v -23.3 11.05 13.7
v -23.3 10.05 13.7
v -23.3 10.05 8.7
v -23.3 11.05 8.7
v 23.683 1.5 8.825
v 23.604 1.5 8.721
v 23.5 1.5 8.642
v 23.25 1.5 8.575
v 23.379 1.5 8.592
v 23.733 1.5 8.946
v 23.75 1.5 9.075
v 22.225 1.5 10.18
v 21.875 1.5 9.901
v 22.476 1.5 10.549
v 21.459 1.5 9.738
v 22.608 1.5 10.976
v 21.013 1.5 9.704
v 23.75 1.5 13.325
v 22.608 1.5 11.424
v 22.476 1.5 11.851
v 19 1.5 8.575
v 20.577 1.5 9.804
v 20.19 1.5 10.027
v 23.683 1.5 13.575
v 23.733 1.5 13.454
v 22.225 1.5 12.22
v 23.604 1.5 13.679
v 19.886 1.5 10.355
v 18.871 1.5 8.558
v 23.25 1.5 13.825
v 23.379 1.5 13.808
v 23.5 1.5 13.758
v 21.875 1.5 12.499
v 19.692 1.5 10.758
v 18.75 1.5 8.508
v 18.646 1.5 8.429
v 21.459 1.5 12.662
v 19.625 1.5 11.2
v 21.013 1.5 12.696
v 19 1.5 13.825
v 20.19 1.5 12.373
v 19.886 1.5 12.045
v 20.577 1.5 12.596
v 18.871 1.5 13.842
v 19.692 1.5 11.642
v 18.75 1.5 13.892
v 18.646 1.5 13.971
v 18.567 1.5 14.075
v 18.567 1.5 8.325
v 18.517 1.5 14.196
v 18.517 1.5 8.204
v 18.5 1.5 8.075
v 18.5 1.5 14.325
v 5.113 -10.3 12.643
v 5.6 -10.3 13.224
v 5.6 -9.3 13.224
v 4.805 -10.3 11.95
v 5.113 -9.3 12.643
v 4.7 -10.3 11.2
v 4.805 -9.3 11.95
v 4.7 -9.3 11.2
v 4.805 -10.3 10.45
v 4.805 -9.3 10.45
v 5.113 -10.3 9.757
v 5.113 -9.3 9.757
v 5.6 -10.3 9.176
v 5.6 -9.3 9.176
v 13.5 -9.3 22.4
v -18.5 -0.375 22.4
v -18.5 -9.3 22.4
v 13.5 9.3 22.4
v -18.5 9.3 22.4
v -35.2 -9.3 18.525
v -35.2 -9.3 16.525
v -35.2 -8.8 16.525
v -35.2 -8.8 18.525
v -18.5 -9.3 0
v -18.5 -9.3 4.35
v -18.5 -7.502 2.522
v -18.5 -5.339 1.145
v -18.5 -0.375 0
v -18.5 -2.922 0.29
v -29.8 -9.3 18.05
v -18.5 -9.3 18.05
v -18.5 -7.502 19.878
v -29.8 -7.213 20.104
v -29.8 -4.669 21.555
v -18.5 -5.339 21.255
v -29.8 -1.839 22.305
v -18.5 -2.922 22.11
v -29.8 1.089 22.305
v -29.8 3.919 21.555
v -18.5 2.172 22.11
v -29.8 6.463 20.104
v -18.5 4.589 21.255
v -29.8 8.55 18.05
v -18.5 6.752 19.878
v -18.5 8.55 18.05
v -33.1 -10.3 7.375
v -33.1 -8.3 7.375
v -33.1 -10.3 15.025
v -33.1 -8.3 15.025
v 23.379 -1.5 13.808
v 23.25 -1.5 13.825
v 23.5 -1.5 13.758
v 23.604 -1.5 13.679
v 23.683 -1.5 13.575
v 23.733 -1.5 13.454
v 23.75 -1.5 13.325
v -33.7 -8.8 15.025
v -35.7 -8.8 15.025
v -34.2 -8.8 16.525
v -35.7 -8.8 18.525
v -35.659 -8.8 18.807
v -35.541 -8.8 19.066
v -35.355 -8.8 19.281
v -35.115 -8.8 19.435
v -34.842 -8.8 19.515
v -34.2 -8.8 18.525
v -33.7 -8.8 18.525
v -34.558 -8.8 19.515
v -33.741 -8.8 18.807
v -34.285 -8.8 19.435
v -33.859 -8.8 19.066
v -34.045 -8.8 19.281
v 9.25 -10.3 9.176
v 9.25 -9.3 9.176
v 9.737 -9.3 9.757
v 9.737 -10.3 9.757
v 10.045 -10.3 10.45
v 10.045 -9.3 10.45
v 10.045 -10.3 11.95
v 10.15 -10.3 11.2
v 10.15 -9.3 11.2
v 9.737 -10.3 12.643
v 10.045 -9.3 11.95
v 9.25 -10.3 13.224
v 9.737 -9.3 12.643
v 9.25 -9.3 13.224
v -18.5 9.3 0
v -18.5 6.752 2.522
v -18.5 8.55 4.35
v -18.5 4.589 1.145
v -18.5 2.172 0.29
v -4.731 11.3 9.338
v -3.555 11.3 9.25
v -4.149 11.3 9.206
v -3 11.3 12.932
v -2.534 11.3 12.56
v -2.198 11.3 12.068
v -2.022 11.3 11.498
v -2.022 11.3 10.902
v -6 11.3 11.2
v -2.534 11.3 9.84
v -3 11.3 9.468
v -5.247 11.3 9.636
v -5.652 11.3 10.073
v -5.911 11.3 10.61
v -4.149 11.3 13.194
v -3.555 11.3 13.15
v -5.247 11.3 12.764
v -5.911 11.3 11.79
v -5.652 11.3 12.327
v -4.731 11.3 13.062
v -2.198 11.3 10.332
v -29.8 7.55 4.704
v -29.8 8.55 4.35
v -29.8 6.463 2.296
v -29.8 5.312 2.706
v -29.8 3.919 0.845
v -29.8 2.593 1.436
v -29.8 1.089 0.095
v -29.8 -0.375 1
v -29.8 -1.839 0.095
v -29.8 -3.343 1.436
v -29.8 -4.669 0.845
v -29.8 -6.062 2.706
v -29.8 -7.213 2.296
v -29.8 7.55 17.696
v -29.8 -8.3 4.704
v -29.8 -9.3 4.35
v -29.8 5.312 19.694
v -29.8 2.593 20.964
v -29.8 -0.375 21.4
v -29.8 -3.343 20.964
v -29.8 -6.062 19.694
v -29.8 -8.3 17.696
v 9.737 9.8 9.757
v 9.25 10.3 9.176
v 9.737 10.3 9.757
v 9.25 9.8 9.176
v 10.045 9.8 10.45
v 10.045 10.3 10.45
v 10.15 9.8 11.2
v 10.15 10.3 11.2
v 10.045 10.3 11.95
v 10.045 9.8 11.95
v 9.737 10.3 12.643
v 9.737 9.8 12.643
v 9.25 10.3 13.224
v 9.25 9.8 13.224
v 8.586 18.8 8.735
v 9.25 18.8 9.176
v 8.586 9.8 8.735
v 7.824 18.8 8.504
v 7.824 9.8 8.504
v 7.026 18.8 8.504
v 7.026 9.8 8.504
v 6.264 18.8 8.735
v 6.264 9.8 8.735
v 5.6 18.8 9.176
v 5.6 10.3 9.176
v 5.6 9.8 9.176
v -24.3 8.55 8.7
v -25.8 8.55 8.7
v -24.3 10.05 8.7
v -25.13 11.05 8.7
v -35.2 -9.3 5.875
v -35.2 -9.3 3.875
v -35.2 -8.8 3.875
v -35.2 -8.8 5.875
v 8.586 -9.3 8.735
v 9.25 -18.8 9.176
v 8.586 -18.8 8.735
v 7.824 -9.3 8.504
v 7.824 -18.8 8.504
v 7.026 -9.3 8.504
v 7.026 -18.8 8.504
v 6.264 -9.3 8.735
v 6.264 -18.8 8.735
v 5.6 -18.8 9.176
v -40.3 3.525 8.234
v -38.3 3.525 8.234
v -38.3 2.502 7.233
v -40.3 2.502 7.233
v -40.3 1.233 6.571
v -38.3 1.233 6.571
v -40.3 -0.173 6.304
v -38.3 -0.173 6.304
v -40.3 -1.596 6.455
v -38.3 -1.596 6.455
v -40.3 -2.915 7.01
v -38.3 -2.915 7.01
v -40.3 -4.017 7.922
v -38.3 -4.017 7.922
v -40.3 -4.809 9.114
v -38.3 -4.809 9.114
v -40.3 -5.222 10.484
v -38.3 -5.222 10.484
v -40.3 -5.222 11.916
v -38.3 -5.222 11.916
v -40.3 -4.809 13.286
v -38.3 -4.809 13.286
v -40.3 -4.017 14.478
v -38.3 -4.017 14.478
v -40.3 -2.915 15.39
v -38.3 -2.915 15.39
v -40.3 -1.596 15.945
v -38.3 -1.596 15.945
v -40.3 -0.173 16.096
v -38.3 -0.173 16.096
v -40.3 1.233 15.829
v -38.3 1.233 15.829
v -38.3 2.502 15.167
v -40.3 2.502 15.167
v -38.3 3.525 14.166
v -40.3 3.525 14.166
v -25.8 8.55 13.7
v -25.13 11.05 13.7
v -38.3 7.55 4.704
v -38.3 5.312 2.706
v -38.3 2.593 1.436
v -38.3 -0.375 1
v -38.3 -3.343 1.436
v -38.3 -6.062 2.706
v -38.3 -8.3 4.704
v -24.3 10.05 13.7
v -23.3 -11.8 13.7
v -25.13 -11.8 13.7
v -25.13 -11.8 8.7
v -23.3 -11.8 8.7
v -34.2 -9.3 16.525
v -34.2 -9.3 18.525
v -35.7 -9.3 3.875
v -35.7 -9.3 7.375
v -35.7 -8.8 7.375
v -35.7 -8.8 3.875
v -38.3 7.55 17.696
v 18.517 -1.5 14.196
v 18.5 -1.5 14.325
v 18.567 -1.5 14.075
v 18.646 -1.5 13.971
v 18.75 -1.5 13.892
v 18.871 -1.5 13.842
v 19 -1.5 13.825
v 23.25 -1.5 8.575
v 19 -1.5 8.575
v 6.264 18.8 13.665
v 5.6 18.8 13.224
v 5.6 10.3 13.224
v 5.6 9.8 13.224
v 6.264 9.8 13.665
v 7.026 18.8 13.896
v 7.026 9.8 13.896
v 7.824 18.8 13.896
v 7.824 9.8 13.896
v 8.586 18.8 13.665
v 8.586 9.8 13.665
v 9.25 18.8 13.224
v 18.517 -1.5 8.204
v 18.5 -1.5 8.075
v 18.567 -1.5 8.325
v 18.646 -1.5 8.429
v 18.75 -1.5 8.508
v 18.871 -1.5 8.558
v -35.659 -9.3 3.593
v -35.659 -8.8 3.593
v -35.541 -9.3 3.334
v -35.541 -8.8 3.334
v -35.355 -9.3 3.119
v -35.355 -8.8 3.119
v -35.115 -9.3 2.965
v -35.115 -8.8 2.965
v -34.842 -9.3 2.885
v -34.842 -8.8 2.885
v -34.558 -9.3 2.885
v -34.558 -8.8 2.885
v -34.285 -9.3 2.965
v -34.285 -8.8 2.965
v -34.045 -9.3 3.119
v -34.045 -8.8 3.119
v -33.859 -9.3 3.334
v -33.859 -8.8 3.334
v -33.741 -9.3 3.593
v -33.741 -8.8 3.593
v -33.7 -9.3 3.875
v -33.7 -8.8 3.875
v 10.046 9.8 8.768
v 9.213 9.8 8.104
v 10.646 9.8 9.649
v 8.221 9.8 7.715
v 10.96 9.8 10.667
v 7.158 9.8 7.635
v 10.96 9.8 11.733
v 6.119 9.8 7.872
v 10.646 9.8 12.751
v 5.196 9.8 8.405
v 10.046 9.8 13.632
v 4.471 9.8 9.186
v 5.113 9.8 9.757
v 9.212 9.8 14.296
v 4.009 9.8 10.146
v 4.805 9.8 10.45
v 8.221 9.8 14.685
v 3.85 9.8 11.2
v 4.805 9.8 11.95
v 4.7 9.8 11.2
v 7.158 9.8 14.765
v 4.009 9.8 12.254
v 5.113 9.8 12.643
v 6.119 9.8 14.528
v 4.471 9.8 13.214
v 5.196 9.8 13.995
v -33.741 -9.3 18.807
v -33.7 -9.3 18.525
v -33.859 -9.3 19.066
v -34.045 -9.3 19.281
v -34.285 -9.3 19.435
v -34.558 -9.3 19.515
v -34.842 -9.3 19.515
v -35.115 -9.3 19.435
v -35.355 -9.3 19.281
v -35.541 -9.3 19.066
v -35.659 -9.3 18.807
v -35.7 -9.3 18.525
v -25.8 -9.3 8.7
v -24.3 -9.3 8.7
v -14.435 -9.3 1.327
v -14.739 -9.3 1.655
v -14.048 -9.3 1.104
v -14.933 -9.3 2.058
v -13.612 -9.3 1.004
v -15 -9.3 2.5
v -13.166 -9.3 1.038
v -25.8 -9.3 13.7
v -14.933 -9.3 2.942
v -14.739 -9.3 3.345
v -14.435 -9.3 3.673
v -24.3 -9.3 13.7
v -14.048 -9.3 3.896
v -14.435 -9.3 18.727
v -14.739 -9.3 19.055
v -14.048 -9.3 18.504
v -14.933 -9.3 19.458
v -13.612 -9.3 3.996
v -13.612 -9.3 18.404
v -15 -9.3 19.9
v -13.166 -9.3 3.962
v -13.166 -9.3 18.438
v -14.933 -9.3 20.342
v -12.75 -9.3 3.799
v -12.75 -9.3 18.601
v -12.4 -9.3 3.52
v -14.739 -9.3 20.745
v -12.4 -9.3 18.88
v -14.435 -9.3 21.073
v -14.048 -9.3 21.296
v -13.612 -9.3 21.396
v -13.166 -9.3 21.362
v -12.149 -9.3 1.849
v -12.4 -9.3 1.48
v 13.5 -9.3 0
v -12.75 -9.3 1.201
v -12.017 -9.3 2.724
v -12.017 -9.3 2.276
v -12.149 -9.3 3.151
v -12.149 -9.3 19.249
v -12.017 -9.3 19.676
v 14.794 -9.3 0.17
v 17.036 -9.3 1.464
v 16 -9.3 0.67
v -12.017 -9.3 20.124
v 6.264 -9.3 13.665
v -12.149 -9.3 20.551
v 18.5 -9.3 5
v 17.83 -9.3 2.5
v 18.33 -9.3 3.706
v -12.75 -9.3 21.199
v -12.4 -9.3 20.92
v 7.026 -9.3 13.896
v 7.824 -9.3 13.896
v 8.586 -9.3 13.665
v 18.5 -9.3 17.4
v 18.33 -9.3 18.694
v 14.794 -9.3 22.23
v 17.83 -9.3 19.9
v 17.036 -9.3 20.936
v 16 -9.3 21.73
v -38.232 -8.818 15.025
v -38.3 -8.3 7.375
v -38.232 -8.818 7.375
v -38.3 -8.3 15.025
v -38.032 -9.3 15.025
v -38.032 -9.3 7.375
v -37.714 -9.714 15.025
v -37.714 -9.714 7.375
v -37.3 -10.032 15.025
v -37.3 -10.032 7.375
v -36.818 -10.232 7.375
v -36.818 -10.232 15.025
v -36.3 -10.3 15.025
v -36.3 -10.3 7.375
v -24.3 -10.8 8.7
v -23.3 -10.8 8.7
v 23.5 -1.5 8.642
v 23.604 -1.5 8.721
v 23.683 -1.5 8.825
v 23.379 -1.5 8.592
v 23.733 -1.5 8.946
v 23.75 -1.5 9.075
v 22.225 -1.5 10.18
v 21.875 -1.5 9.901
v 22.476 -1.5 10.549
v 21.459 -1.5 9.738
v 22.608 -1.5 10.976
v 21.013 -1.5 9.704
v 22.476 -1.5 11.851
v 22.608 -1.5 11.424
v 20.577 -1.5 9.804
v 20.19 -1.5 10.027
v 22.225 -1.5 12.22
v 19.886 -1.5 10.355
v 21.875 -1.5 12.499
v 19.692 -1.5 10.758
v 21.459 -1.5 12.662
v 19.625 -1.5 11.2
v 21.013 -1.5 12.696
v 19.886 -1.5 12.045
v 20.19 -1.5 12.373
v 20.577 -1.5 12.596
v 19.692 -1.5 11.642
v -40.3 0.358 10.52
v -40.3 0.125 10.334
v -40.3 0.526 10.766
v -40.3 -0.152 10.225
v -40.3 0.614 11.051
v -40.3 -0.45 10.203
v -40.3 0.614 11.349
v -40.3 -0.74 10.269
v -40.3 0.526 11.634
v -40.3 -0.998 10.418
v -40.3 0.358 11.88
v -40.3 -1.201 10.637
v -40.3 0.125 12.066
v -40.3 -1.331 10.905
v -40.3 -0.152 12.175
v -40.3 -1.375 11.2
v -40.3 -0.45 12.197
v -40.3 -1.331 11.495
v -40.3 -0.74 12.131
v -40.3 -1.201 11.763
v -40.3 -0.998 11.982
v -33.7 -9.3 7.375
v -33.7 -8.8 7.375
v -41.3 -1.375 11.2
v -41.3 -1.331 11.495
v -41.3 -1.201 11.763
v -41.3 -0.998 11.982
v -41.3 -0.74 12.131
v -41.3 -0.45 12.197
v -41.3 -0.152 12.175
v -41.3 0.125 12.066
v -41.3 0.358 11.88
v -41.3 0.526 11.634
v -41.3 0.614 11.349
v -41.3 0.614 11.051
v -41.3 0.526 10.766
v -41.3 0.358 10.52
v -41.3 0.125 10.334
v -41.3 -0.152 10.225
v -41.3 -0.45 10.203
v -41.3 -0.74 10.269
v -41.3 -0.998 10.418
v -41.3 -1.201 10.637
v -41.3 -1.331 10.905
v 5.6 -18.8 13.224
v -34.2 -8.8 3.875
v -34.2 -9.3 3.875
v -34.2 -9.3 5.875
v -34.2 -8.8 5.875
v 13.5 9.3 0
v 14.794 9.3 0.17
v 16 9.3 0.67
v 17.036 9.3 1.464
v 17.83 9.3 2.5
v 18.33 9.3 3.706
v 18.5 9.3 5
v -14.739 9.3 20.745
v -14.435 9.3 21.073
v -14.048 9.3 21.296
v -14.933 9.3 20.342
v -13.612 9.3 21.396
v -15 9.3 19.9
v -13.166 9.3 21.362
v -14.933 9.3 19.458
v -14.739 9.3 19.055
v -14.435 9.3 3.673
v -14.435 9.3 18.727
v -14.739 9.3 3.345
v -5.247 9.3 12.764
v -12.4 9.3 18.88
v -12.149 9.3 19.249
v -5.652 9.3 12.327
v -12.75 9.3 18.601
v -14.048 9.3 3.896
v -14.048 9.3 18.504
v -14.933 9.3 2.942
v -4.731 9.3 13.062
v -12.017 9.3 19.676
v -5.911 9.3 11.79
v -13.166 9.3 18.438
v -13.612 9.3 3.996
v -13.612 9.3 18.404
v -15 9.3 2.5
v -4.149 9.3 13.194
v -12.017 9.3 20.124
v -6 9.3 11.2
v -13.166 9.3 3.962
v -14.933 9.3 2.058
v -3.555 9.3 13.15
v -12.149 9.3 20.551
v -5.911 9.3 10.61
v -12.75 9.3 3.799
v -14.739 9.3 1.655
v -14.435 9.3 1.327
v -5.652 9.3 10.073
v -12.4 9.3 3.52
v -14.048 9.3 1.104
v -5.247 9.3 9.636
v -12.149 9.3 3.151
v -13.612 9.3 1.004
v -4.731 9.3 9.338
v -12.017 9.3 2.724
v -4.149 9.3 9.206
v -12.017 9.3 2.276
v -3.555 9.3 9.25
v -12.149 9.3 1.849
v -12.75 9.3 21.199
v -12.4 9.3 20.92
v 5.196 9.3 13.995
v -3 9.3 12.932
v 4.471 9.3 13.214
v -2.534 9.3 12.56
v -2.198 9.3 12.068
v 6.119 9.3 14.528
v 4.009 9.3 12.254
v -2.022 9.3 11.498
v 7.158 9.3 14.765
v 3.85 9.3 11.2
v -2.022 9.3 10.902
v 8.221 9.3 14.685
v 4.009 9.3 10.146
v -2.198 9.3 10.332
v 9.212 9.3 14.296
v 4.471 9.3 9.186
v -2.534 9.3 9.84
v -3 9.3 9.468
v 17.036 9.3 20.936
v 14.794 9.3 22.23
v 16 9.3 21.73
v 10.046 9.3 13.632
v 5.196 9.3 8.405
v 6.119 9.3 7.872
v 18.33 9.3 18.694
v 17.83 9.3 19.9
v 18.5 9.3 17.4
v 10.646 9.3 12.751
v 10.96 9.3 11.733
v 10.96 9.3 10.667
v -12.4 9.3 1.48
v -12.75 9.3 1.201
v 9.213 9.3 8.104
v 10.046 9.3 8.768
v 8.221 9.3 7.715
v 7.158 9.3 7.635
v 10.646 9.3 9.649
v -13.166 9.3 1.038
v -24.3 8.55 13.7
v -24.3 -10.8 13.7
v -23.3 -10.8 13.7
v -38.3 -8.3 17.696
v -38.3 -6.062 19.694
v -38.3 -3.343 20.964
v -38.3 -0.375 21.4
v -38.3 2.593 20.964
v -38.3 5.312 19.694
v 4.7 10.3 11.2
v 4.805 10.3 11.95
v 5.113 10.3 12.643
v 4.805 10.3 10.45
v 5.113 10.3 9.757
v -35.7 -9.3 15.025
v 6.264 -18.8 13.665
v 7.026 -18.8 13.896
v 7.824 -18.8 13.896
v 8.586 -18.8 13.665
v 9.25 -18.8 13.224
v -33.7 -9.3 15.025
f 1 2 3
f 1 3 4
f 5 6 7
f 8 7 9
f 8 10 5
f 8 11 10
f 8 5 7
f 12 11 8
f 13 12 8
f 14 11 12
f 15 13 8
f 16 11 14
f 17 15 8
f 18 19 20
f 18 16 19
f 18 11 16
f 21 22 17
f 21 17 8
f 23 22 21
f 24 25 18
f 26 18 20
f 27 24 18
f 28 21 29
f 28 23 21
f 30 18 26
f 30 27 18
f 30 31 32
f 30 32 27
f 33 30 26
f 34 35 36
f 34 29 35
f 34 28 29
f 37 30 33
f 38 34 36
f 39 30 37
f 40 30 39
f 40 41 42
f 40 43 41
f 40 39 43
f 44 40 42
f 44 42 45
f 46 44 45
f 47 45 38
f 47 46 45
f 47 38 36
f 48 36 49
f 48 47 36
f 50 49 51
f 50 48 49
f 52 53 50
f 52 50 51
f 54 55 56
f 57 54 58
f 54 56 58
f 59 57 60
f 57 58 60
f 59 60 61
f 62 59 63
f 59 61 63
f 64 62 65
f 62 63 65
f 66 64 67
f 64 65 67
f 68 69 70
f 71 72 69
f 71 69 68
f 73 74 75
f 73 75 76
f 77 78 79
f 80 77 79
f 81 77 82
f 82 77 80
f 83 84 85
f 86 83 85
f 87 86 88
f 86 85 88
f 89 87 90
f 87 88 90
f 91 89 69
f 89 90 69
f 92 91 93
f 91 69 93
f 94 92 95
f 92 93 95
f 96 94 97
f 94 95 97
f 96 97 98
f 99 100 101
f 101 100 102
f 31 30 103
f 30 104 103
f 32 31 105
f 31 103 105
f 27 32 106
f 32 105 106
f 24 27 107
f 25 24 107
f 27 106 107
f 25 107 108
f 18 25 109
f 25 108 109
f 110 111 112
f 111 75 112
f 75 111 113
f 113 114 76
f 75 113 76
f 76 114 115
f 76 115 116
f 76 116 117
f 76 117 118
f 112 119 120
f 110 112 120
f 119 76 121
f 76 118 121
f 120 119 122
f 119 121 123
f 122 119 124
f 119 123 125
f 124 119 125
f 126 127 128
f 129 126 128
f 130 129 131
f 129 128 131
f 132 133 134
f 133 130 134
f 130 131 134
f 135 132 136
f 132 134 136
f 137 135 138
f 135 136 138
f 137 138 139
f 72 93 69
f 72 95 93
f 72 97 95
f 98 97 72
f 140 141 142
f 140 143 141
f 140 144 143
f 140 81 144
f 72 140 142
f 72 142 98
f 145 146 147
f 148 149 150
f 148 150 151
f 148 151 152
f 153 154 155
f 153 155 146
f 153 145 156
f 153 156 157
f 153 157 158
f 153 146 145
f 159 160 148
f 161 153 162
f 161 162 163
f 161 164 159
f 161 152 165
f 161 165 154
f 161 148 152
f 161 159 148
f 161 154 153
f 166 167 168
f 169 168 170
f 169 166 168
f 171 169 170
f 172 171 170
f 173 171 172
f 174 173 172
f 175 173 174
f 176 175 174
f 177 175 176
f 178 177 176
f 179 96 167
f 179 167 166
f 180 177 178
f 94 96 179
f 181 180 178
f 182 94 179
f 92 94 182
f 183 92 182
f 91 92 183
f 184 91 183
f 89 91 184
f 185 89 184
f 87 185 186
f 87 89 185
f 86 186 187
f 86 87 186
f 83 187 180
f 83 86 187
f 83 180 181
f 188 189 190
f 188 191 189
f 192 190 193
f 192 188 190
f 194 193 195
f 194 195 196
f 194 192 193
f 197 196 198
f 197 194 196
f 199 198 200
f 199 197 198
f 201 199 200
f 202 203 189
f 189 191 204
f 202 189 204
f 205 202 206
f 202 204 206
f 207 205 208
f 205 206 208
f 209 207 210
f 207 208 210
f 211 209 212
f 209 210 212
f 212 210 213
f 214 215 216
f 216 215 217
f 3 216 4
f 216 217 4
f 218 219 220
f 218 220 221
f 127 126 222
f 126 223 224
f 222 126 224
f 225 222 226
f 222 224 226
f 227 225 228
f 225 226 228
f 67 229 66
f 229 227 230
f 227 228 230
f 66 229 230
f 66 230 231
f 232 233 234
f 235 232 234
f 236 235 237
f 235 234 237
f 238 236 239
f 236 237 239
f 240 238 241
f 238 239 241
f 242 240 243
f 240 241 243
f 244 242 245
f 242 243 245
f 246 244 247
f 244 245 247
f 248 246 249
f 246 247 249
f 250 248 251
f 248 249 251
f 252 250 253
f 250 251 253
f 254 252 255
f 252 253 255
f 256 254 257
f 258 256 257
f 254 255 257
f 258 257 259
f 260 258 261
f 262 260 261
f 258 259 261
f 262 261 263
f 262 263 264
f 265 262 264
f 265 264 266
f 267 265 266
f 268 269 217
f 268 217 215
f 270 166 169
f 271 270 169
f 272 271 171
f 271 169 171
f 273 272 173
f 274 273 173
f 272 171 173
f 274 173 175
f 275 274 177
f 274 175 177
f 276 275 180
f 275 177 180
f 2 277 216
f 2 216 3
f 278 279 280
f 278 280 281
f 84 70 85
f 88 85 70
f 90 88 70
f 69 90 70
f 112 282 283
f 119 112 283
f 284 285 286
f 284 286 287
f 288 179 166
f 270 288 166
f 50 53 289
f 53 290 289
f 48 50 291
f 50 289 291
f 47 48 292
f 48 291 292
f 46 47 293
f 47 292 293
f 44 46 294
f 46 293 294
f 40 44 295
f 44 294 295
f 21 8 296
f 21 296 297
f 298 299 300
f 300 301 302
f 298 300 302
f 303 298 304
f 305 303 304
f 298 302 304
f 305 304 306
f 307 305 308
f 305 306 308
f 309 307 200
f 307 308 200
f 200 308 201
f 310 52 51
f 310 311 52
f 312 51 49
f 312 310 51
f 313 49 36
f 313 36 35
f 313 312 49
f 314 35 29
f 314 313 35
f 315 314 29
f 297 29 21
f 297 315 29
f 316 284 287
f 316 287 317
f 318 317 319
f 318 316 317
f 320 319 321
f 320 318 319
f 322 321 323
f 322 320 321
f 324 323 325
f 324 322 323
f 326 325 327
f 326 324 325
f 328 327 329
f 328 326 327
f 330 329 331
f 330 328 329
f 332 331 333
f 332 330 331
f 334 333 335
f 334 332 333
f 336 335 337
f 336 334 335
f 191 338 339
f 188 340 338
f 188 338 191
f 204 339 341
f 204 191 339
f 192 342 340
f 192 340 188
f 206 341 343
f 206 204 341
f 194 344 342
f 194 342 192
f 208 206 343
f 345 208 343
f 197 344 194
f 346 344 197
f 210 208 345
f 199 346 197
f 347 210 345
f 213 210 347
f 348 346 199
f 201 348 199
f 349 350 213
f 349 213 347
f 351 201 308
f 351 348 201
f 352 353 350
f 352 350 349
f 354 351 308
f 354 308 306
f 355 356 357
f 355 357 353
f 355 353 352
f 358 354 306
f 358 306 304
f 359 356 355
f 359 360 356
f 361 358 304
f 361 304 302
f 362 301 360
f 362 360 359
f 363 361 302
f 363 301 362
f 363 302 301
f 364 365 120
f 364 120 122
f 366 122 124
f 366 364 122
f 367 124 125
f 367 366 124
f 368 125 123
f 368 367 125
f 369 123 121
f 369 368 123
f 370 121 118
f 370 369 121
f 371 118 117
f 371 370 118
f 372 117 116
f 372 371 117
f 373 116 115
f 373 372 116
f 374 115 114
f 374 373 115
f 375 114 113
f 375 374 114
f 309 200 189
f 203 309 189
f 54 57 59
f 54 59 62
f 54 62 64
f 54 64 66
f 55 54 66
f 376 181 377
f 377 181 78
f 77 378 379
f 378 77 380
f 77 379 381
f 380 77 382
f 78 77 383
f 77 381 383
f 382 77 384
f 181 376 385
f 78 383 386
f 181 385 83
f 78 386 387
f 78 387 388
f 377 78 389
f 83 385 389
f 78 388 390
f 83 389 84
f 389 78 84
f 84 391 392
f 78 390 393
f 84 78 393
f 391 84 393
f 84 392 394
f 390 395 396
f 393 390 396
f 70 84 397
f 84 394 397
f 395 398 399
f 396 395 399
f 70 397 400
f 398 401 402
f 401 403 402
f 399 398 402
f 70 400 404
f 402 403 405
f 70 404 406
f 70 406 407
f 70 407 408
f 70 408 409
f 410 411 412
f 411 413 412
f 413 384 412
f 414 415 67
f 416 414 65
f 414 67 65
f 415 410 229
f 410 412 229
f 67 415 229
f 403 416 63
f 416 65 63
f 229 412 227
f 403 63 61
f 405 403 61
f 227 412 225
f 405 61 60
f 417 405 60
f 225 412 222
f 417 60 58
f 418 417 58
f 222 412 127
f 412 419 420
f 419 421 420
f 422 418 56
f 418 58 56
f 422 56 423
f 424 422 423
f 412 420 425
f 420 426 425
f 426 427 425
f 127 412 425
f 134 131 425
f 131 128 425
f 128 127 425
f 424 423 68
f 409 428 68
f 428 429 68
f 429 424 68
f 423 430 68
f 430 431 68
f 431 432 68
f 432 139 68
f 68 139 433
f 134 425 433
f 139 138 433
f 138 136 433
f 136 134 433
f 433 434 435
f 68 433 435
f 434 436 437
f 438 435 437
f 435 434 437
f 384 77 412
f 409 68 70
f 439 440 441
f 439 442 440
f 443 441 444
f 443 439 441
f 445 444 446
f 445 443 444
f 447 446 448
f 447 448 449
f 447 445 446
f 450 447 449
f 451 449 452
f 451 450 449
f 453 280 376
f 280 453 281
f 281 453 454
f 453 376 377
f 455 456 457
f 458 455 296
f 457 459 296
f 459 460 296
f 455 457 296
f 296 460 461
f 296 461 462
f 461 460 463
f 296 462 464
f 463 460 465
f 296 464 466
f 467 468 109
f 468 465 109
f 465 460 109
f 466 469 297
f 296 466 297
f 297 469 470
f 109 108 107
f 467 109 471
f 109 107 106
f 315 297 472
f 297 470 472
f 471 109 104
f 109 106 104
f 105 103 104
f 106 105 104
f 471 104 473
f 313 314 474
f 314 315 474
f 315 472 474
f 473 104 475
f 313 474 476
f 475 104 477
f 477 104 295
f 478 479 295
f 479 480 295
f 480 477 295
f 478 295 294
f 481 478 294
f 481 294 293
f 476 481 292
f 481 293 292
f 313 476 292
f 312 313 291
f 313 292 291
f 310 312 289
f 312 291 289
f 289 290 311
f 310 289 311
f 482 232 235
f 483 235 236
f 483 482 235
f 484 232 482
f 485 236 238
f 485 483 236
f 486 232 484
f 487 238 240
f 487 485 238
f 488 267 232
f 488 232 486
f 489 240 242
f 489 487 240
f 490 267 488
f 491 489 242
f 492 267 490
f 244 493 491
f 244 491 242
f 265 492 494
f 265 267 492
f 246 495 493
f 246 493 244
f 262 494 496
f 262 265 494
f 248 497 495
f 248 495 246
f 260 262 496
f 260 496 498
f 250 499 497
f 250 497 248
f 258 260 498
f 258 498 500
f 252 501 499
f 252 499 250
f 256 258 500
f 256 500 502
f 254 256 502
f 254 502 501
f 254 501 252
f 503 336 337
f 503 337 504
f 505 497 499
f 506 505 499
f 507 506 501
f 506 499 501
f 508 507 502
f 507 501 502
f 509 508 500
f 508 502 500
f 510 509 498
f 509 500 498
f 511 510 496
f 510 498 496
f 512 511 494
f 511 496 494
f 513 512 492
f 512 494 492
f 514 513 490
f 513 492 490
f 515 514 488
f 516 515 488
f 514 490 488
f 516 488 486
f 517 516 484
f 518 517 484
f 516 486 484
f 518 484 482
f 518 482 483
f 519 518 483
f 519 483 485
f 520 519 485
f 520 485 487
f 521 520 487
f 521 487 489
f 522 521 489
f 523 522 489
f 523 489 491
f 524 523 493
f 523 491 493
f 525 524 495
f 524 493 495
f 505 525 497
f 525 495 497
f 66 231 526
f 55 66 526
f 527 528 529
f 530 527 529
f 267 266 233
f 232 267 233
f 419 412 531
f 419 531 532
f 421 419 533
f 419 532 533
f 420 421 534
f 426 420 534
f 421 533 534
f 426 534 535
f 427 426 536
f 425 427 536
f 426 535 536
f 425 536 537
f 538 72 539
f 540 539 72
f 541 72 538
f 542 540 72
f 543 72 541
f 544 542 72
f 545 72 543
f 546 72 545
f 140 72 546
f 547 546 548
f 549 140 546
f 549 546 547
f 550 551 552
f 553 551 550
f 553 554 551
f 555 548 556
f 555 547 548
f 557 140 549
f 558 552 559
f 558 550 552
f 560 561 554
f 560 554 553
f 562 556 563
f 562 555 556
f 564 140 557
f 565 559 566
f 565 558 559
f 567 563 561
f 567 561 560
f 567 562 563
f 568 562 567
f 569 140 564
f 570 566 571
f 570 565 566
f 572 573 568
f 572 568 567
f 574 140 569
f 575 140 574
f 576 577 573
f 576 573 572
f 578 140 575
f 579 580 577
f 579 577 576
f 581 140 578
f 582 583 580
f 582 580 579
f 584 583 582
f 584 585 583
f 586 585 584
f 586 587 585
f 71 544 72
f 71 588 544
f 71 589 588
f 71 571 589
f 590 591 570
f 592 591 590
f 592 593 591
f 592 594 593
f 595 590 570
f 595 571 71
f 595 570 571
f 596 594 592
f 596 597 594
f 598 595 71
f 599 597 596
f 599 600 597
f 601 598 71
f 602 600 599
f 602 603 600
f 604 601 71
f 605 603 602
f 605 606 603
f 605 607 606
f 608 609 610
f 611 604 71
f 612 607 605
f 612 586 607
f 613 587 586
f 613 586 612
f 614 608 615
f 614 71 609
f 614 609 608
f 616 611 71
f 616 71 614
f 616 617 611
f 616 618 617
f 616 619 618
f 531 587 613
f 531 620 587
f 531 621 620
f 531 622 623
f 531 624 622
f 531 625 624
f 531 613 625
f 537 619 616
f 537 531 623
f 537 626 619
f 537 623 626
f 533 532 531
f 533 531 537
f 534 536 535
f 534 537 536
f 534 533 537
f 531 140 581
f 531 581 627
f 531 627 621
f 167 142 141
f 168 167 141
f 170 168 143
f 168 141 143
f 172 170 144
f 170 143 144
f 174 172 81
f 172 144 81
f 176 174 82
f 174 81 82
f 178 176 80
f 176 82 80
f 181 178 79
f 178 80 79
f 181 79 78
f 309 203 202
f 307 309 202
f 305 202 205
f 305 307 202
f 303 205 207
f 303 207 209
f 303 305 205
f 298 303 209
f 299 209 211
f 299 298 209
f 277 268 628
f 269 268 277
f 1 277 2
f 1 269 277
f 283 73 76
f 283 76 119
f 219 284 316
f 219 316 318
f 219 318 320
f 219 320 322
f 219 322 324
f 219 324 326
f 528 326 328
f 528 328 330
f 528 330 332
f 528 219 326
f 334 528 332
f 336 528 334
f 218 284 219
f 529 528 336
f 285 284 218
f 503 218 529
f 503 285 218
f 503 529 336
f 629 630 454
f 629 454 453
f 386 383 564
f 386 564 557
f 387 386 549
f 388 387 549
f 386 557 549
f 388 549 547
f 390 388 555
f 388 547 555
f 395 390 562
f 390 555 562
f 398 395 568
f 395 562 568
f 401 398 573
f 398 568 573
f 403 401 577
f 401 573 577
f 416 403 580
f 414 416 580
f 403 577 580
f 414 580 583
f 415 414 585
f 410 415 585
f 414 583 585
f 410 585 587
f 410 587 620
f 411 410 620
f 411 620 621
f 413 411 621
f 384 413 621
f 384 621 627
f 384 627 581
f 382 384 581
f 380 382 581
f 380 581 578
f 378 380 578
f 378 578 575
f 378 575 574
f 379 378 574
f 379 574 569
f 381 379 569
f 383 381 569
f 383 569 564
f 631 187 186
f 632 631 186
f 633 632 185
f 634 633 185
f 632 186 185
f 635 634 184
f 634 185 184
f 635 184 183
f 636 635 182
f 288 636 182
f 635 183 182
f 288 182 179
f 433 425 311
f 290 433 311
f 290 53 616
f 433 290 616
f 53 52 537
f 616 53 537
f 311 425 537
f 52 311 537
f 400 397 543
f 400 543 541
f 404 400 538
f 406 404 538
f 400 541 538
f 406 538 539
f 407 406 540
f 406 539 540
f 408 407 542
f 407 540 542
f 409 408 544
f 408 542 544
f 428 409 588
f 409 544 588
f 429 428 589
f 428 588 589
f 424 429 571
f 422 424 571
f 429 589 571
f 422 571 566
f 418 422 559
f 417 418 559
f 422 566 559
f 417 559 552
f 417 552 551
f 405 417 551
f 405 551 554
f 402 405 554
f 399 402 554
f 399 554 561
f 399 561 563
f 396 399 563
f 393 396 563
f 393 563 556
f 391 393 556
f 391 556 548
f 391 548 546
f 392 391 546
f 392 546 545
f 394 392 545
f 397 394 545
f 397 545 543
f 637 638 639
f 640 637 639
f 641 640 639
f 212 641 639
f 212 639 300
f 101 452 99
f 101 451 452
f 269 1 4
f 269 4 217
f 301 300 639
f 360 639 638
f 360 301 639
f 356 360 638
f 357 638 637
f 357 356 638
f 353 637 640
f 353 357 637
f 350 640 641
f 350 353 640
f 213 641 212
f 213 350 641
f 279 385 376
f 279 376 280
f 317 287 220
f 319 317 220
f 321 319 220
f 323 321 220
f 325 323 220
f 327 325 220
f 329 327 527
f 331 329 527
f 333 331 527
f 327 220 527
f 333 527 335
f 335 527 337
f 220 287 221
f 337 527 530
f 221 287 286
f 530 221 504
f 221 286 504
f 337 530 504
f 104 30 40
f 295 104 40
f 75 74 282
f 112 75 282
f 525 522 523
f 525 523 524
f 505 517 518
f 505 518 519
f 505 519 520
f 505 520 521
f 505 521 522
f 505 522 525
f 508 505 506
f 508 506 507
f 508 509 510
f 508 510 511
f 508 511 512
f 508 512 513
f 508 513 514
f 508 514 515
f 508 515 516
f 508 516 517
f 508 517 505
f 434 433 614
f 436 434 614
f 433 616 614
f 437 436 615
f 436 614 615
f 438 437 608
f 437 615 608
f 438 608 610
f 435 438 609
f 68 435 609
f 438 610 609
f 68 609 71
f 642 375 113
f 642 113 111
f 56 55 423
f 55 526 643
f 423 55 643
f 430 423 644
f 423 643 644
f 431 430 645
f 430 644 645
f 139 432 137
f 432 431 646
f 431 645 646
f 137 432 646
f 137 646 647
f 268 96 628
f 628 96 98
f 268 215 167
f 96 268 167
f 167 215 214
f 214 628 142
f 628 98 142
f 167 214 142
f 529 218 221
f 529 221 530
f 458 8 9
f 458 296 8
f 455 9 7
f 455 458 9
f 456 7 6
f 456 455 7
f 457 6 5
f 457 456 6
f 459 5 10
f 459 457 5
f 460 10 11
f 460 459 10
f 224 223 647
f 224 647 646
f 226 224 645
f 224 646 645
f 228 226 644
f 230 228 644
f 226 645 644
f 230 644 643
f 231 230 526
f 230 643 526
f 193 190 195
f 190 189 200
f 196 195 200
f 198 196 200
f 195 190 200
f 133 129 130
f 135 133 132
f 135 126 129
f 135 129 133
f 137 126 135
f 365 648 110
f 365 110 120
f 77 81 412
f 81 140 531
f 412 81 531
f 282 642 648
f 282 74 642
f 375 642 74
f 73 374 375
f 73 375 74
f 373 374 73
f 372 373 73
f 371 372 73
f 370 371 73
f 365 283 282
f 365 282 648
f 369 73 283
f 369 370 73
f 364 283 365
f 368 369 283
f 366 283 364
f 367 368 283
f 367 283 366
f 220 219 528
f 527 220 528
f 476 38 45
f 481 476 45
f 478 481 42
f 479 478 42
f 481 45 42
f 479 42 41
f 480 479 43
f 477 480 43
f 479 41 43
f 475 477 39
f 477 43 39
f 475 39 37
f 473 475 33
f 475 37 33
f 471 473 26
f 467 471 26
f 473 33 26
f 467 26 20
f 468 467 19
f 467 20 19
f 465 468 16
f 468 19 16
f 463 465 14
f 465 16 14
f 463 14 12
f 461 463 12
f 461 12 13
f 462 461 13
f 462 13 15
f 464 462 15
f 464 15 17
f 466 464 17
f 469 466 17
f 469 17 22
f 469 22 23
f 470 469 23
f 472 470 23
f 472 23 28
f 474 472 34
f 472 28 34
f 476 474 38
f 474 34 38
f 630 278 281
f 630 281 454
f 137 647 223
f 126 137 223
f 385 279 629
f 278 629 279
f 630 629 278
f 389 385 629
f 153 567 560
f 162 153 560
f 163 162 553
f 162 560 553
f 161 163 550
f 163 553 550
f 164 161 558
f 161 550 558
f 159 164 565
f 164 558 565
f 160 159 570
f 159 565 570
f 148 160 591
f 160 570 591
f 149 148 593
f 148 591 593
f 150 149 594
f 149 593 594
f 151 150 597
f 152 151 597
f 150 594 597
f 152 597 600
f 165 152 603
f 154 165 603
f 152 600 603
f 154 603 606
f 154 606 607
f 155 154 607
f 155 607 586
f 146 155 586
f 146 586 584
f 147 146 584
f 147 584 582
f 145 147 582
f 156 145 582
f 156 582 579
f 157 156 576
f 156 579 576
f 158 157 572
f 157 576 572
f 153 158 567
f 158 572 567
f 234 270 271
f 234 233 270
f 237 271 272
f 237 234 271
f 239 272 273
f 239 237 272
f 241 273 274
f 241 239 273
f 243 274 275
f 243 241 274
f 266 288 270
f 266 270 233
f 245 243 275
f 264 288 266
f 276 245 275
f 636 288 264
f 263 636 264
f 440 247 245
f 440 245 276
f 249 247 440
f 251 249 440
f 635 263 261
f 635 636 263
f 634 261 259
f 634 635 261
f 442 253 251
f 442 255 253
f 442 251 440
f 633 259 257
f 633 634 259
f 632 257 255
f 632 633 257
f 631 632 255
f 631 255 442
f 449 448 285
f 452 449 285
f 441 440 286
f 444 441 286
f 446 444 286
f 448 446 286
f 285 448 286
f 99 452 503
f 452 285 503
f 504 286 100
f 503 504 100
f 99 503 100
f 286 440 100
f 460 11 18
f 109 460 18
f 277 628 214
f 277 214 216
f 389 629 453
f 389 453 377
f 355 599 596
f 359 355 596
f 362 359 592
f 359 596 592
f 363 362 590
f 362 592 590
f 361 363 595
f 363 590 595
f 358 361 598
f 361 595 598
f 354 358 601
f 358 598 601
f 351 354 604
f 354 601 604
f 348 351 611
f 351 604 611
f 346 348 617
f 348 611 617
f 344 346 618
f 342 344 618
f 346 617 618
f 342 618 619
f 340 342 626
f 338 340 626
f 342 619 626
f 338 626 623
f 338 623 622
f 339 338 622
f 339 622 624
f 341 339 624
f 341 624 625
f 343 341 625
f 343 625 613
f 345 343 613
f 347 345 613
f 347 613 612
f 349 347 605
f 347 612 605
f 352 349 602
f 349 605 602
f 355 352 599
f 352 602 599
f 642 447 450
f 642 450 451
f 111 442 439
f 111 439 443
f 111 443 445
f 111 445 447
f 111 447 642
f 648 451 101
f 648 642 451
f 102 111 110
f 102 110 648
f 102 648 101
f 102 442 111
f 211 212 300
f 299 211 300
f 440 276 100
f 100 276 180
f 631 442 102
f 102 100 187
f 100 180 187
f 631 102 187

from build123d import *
from build123d import SkipClean  # not in build123d's __all__

# Parameters (mm, degrees)
F0_W           = 37
F0_H           = 18.6
F1_DEPTH       = 22.4
F3_DEPTH       = 11.3
F5_DEPTH       = 8.5
F7_DEPTH       = 2
F8_R           = 1
F9_DEPTH       = 1
F10_R          = 3.575
F11_DEPTH      = 0.5
F11_DEPTH_BACK = 19.1
F13_DEPTH      = 9
F13_DEPTH_BACK = 28.6
F14_R          = 5
F16_START      = -7.8
F15_W          = 5.25
F15_H          = 5.25
F15_R          = 1.5
F16_DEPTH      = 3
F17_R          = 0.5
F19_START      = -8.7
F19_DEPTH      = 5
F20_R          = 2
F21_DEPTH      = 2
F22_R          = 1.5
F23_DEPTH      = 28.101
F24_DEPTH      = 0.5
F25_R          = 2.725
F26_DEPTH      = 1
F26_DEPTH_BACK = 19.6
F27_W          = 5.2
F27_H          = 7.65
F28_DEPTH      = 2
F29_R          = 2
F31_START      = -1
F30_W          = 1
F30_H          = 2
F31_DEPTH      = 0.5


# Not quite as in the source:
# - after a boolean that leaves OpenCascade's solid faulty, fix() repairs it


with BuildPart() as f1:
    # F0 (on Top) → F1 (new body)
    with BuildSketch(Plane.XY):
        Rectangle(F0_W, F0_H)
    extrude(amount=F1_DEPTH)

    # F2 (on face) → F3 (join)
    with BuildSketch(Plane(origin=(-18.5, 0, 0), x_dir=(0, -1, 0), z_dir=(-1, 0, 0))):
        with BuildLine():
            ThreePointArc((-8.55, 4.35), (0.375, 0), (9.3, 4.35))
            Line((9.3, 4.35), (9.3, 18.05))
            ThreePointArc((9.3, 18.05), (0.375, 22.4), (-8.55, 18.05))
            Line((-8.55, 18.05), (-8.55, 4.35))
        make_face()
    extrude(amount=F3_DEPTH)

    # F4 (on face) → F5 (join)
    with BuildSketch(Plane(origin=(-29.8, 0, 0), x_dir=(0, -1, 0), z_dir=(-1, 0, 0))):
        with BuildLine():
            Line((-7.55, 17.6964123944), (-7.55, 4.7035876056))
            ThreePointArc((-7.55, 4.7035876056), (0.375, 1), (8.3, 4.7035876056))
            Line((8.3, 4.7035876056), (8.3, 17.6964123944))
            ThreePointArc((8.3, 17.6964123944), (0.375, 21.4), (-7.55, 17.6964123944))
        make_face()
    extrude(amount=F5_DEPTH)

    # F6 (on face) → F7 (join)
    with BuildSketch(Plane(origin=(-38.3, 0, 0), x_dir=(0, -1, 0), z_dir=(-1, 0, 0))):
        with BuildLine():
            Line((-3.525, 14.1664793948), (-3.525, 8.2335206052))
            ThreePointArc((-3.525, 8.2335206052), (5.275, 11.2), (-3.525, 14.1664793948))
        make_face()
    extrude(amount=F7_DEPTH)

    # F8 (on face) → F9 (join)
    with BuildSketch(Plane(origin=(-40.3, 0, 0), x_dir=(0, -1, 0), z_dir=(-1, 0, 0))):
        with Locations((0.375, 11.2)):
            Circle(F8_R)
    extrude(amount=F9_DEPTH)

    # F10 (on face) → F11 (join, two sides)
    with BuildSketch(Plane(origin=(0, 9.3, 0), x_dir=(-1, 0, 0), z_dir=(0, 1, 0))) as f11_sk:
        with Locations((-7.425, 11.2)):
            Circle(F10_R)
    extrude(amount=F11_DEPTH)
    extrude(f11_sk.sketch, amount=-F11_DEPTH_BACK)

    # F12 (on face) → F13 (join, two sides)
    with BuildSketch(Plane(origin=(0, 9.8, 0), x_dir=(-1, 0, 0), z_dir=(0, 1, 0))) as f13_sk:
        with BuildLine():
            Line((-5.6, 9.1763893655), (-5.6, 13.2236106345))
            ThreePointArc((-5.6, 13.2236106345), (-7.425, 13.925), (-9.25, 13.2236106345))
            Line((-9.25, 13.2236106345), (-9.25, 9.1763893655))
            ThreePointArc((-9.25, 9.1763893655), (-7.425, 8.475), (-5.6, 9.1763893655))
        make_face()
    extrude(amount=F13_DEPTH)
    extrude(f13_sk.sketch, amount=-F13_DEPTH_BACK)

    # F14
    f14_edges = [f1.edges().sort_by_distance(p)[0] for p in [
        (18.5, 0, 0),
        (18.5, 0, 22.4),
    ]]
    fillet(f14_edges, radius=F14_R)

    # F15 (on face) → F16 (join)
    with BuildSketch(Plane(origin=(0, 9.3, 0), x_dir=(-1, 0, 0), z_dir=(0, 1, 0)).offset(F16_START)):
        with Locations((-21.125, 11.2)):
            Rectangle(F15_W, F15_H)
        with Locations((-21.125, 11.2)):
            Circle(F15_R, mode=Mode.SUBTRACT)
    extrude(amount=-F16_DEPTH)

    # F17
    f17_edges = [f1.edges().sort_by_distance(p)[0] for p in [
        (23.75, 0, 13.825),
        (18.5, 0, 13.825),
        (23.75, 0, 8.575),
        (18.5, 0, 8.575),
    ]]
    fillet(f17_edges, radius=F17_R)

    # F18 (on face) → F19 (join)
    with BuildSketch(Plane.XY.offset(22.4).offset(F19_START)):
        Polygon((-25.1301270189, 11.05), (-25.8, 8.55), (-24.3, 8.55), (-24.3, 10.05), (-23.3, 10.05), (-23.3, 11.05), align=None)
        Polygon((-23.3, -10.8), (-24.3, -10.8), (-24.3, -9.3), (-25.8, -9.3), (-25.1301270189, -11.8), (-23.3, -11.8), align=None)
    extrude(amount=-F19_DEPTH)

    # F20 (on face) → F21 (join)
    with BuildSketch(Plane(origin=(0, 9.3, 0), x_dir=(-1, 0, 0), z_dir=(0, 1, 0))):
        with Locations((4, 11.2)):
            Circle(F20_R)
    extrude(amount=F21_DEPTH)

    # F22 (on face) → F23 (cut, through all)
    with BuildSketch(Plane(origin=(0, 9.3, 0), x_dir=(-1, 0, 0), z_dir=(0, 1, 0))):
        with Locations((13.5, 19.9)):
            Circle(F22_R)
        with Locations((13.5, 2.5)):
            Circle(F22_R)
    extrude(amount=-F23_DEPTH, mode=Mode.SUBTRACT)

    # F24 (cut): a face of the model
    f24_faces = [f1.faces().sort_by_distance(p)[0] for p in [
        (10.8988837303, -9.8, 11.2),
    ]]
    extrude(f24_faces, amount=-F24_DEPTH, mode=Mode.SUBTRACT)

    # F25 (on face) → F26 (join, two sides)
    with BuildSketch(Plane.XZ.offset(9.3)) as f26_sk:
        with Locations((7.425, 11.2)):
            Circle(F25_R)
    with SkipClean():  # cleaning this boolean's faces spoils the solid; the shape is the same uncleaned
        extrude(amount=F26_DEPTH)
        extrude(f26_sk.sketch, amount=-F26_DEPTH_BACK)

    # F27 (on face) → F28 (join)
    with BuildSketch(Plane.XZ.offset(8.3)):
        with Locations((-35.7, 11.2)):
            Rectangle(F27_W, F27_H)
    extrude(amount=F28_DEPTH)

    add(f1.part.fix(), mode=Mode.REPLACE)

    # F29
    f29_edges = [f1.edges().sort_by_distance(p)[0] for p in [
        (-38.3, -10.3, 11.2),
    ]]
    fillet(f29_edges, radius=F29_R)

    # F30 (on face) → F31 (join)
    with BuildSketch(Plane.XZ.offset(10.3).offset(F31_START)):
        with BuildLine():
            Line((-35.7, 18.525), (-35.7, 15.025))
            Line((-35.7, 15.025), (-33.7, 15.025))
            Line((-33.7, 15.025), (-33.7, 18.525))
            ThreePointArc((-33.7, 18.525), (-34.7, 19.525), (-35.7, 18.525))
        make_face()
        with Locations((-34.7, 17.525)):
            Rectangle(F30_W, F30_H, mode=Mode.SUBTRACT)
        with BuildLine():
            Line((-35.7, 7.375), (-35.7, 3.875))
            ThreePointArc((-35.7, 3.875), (-34.7, 2.875), (-33.7, 3.875))
            Line((-33.7, 3.875), (-33.7, 7.375))
            Line((-33.7, 7.375), (-35.7, 7.375))
        make_face()
        with Locations((-34.7, 4.875)):
            Rectangle(F30_W, F30_H, mode=Mode.SUBTRACT)
    extrude(amount=-F31_DEPTH)


solid = f1.part
